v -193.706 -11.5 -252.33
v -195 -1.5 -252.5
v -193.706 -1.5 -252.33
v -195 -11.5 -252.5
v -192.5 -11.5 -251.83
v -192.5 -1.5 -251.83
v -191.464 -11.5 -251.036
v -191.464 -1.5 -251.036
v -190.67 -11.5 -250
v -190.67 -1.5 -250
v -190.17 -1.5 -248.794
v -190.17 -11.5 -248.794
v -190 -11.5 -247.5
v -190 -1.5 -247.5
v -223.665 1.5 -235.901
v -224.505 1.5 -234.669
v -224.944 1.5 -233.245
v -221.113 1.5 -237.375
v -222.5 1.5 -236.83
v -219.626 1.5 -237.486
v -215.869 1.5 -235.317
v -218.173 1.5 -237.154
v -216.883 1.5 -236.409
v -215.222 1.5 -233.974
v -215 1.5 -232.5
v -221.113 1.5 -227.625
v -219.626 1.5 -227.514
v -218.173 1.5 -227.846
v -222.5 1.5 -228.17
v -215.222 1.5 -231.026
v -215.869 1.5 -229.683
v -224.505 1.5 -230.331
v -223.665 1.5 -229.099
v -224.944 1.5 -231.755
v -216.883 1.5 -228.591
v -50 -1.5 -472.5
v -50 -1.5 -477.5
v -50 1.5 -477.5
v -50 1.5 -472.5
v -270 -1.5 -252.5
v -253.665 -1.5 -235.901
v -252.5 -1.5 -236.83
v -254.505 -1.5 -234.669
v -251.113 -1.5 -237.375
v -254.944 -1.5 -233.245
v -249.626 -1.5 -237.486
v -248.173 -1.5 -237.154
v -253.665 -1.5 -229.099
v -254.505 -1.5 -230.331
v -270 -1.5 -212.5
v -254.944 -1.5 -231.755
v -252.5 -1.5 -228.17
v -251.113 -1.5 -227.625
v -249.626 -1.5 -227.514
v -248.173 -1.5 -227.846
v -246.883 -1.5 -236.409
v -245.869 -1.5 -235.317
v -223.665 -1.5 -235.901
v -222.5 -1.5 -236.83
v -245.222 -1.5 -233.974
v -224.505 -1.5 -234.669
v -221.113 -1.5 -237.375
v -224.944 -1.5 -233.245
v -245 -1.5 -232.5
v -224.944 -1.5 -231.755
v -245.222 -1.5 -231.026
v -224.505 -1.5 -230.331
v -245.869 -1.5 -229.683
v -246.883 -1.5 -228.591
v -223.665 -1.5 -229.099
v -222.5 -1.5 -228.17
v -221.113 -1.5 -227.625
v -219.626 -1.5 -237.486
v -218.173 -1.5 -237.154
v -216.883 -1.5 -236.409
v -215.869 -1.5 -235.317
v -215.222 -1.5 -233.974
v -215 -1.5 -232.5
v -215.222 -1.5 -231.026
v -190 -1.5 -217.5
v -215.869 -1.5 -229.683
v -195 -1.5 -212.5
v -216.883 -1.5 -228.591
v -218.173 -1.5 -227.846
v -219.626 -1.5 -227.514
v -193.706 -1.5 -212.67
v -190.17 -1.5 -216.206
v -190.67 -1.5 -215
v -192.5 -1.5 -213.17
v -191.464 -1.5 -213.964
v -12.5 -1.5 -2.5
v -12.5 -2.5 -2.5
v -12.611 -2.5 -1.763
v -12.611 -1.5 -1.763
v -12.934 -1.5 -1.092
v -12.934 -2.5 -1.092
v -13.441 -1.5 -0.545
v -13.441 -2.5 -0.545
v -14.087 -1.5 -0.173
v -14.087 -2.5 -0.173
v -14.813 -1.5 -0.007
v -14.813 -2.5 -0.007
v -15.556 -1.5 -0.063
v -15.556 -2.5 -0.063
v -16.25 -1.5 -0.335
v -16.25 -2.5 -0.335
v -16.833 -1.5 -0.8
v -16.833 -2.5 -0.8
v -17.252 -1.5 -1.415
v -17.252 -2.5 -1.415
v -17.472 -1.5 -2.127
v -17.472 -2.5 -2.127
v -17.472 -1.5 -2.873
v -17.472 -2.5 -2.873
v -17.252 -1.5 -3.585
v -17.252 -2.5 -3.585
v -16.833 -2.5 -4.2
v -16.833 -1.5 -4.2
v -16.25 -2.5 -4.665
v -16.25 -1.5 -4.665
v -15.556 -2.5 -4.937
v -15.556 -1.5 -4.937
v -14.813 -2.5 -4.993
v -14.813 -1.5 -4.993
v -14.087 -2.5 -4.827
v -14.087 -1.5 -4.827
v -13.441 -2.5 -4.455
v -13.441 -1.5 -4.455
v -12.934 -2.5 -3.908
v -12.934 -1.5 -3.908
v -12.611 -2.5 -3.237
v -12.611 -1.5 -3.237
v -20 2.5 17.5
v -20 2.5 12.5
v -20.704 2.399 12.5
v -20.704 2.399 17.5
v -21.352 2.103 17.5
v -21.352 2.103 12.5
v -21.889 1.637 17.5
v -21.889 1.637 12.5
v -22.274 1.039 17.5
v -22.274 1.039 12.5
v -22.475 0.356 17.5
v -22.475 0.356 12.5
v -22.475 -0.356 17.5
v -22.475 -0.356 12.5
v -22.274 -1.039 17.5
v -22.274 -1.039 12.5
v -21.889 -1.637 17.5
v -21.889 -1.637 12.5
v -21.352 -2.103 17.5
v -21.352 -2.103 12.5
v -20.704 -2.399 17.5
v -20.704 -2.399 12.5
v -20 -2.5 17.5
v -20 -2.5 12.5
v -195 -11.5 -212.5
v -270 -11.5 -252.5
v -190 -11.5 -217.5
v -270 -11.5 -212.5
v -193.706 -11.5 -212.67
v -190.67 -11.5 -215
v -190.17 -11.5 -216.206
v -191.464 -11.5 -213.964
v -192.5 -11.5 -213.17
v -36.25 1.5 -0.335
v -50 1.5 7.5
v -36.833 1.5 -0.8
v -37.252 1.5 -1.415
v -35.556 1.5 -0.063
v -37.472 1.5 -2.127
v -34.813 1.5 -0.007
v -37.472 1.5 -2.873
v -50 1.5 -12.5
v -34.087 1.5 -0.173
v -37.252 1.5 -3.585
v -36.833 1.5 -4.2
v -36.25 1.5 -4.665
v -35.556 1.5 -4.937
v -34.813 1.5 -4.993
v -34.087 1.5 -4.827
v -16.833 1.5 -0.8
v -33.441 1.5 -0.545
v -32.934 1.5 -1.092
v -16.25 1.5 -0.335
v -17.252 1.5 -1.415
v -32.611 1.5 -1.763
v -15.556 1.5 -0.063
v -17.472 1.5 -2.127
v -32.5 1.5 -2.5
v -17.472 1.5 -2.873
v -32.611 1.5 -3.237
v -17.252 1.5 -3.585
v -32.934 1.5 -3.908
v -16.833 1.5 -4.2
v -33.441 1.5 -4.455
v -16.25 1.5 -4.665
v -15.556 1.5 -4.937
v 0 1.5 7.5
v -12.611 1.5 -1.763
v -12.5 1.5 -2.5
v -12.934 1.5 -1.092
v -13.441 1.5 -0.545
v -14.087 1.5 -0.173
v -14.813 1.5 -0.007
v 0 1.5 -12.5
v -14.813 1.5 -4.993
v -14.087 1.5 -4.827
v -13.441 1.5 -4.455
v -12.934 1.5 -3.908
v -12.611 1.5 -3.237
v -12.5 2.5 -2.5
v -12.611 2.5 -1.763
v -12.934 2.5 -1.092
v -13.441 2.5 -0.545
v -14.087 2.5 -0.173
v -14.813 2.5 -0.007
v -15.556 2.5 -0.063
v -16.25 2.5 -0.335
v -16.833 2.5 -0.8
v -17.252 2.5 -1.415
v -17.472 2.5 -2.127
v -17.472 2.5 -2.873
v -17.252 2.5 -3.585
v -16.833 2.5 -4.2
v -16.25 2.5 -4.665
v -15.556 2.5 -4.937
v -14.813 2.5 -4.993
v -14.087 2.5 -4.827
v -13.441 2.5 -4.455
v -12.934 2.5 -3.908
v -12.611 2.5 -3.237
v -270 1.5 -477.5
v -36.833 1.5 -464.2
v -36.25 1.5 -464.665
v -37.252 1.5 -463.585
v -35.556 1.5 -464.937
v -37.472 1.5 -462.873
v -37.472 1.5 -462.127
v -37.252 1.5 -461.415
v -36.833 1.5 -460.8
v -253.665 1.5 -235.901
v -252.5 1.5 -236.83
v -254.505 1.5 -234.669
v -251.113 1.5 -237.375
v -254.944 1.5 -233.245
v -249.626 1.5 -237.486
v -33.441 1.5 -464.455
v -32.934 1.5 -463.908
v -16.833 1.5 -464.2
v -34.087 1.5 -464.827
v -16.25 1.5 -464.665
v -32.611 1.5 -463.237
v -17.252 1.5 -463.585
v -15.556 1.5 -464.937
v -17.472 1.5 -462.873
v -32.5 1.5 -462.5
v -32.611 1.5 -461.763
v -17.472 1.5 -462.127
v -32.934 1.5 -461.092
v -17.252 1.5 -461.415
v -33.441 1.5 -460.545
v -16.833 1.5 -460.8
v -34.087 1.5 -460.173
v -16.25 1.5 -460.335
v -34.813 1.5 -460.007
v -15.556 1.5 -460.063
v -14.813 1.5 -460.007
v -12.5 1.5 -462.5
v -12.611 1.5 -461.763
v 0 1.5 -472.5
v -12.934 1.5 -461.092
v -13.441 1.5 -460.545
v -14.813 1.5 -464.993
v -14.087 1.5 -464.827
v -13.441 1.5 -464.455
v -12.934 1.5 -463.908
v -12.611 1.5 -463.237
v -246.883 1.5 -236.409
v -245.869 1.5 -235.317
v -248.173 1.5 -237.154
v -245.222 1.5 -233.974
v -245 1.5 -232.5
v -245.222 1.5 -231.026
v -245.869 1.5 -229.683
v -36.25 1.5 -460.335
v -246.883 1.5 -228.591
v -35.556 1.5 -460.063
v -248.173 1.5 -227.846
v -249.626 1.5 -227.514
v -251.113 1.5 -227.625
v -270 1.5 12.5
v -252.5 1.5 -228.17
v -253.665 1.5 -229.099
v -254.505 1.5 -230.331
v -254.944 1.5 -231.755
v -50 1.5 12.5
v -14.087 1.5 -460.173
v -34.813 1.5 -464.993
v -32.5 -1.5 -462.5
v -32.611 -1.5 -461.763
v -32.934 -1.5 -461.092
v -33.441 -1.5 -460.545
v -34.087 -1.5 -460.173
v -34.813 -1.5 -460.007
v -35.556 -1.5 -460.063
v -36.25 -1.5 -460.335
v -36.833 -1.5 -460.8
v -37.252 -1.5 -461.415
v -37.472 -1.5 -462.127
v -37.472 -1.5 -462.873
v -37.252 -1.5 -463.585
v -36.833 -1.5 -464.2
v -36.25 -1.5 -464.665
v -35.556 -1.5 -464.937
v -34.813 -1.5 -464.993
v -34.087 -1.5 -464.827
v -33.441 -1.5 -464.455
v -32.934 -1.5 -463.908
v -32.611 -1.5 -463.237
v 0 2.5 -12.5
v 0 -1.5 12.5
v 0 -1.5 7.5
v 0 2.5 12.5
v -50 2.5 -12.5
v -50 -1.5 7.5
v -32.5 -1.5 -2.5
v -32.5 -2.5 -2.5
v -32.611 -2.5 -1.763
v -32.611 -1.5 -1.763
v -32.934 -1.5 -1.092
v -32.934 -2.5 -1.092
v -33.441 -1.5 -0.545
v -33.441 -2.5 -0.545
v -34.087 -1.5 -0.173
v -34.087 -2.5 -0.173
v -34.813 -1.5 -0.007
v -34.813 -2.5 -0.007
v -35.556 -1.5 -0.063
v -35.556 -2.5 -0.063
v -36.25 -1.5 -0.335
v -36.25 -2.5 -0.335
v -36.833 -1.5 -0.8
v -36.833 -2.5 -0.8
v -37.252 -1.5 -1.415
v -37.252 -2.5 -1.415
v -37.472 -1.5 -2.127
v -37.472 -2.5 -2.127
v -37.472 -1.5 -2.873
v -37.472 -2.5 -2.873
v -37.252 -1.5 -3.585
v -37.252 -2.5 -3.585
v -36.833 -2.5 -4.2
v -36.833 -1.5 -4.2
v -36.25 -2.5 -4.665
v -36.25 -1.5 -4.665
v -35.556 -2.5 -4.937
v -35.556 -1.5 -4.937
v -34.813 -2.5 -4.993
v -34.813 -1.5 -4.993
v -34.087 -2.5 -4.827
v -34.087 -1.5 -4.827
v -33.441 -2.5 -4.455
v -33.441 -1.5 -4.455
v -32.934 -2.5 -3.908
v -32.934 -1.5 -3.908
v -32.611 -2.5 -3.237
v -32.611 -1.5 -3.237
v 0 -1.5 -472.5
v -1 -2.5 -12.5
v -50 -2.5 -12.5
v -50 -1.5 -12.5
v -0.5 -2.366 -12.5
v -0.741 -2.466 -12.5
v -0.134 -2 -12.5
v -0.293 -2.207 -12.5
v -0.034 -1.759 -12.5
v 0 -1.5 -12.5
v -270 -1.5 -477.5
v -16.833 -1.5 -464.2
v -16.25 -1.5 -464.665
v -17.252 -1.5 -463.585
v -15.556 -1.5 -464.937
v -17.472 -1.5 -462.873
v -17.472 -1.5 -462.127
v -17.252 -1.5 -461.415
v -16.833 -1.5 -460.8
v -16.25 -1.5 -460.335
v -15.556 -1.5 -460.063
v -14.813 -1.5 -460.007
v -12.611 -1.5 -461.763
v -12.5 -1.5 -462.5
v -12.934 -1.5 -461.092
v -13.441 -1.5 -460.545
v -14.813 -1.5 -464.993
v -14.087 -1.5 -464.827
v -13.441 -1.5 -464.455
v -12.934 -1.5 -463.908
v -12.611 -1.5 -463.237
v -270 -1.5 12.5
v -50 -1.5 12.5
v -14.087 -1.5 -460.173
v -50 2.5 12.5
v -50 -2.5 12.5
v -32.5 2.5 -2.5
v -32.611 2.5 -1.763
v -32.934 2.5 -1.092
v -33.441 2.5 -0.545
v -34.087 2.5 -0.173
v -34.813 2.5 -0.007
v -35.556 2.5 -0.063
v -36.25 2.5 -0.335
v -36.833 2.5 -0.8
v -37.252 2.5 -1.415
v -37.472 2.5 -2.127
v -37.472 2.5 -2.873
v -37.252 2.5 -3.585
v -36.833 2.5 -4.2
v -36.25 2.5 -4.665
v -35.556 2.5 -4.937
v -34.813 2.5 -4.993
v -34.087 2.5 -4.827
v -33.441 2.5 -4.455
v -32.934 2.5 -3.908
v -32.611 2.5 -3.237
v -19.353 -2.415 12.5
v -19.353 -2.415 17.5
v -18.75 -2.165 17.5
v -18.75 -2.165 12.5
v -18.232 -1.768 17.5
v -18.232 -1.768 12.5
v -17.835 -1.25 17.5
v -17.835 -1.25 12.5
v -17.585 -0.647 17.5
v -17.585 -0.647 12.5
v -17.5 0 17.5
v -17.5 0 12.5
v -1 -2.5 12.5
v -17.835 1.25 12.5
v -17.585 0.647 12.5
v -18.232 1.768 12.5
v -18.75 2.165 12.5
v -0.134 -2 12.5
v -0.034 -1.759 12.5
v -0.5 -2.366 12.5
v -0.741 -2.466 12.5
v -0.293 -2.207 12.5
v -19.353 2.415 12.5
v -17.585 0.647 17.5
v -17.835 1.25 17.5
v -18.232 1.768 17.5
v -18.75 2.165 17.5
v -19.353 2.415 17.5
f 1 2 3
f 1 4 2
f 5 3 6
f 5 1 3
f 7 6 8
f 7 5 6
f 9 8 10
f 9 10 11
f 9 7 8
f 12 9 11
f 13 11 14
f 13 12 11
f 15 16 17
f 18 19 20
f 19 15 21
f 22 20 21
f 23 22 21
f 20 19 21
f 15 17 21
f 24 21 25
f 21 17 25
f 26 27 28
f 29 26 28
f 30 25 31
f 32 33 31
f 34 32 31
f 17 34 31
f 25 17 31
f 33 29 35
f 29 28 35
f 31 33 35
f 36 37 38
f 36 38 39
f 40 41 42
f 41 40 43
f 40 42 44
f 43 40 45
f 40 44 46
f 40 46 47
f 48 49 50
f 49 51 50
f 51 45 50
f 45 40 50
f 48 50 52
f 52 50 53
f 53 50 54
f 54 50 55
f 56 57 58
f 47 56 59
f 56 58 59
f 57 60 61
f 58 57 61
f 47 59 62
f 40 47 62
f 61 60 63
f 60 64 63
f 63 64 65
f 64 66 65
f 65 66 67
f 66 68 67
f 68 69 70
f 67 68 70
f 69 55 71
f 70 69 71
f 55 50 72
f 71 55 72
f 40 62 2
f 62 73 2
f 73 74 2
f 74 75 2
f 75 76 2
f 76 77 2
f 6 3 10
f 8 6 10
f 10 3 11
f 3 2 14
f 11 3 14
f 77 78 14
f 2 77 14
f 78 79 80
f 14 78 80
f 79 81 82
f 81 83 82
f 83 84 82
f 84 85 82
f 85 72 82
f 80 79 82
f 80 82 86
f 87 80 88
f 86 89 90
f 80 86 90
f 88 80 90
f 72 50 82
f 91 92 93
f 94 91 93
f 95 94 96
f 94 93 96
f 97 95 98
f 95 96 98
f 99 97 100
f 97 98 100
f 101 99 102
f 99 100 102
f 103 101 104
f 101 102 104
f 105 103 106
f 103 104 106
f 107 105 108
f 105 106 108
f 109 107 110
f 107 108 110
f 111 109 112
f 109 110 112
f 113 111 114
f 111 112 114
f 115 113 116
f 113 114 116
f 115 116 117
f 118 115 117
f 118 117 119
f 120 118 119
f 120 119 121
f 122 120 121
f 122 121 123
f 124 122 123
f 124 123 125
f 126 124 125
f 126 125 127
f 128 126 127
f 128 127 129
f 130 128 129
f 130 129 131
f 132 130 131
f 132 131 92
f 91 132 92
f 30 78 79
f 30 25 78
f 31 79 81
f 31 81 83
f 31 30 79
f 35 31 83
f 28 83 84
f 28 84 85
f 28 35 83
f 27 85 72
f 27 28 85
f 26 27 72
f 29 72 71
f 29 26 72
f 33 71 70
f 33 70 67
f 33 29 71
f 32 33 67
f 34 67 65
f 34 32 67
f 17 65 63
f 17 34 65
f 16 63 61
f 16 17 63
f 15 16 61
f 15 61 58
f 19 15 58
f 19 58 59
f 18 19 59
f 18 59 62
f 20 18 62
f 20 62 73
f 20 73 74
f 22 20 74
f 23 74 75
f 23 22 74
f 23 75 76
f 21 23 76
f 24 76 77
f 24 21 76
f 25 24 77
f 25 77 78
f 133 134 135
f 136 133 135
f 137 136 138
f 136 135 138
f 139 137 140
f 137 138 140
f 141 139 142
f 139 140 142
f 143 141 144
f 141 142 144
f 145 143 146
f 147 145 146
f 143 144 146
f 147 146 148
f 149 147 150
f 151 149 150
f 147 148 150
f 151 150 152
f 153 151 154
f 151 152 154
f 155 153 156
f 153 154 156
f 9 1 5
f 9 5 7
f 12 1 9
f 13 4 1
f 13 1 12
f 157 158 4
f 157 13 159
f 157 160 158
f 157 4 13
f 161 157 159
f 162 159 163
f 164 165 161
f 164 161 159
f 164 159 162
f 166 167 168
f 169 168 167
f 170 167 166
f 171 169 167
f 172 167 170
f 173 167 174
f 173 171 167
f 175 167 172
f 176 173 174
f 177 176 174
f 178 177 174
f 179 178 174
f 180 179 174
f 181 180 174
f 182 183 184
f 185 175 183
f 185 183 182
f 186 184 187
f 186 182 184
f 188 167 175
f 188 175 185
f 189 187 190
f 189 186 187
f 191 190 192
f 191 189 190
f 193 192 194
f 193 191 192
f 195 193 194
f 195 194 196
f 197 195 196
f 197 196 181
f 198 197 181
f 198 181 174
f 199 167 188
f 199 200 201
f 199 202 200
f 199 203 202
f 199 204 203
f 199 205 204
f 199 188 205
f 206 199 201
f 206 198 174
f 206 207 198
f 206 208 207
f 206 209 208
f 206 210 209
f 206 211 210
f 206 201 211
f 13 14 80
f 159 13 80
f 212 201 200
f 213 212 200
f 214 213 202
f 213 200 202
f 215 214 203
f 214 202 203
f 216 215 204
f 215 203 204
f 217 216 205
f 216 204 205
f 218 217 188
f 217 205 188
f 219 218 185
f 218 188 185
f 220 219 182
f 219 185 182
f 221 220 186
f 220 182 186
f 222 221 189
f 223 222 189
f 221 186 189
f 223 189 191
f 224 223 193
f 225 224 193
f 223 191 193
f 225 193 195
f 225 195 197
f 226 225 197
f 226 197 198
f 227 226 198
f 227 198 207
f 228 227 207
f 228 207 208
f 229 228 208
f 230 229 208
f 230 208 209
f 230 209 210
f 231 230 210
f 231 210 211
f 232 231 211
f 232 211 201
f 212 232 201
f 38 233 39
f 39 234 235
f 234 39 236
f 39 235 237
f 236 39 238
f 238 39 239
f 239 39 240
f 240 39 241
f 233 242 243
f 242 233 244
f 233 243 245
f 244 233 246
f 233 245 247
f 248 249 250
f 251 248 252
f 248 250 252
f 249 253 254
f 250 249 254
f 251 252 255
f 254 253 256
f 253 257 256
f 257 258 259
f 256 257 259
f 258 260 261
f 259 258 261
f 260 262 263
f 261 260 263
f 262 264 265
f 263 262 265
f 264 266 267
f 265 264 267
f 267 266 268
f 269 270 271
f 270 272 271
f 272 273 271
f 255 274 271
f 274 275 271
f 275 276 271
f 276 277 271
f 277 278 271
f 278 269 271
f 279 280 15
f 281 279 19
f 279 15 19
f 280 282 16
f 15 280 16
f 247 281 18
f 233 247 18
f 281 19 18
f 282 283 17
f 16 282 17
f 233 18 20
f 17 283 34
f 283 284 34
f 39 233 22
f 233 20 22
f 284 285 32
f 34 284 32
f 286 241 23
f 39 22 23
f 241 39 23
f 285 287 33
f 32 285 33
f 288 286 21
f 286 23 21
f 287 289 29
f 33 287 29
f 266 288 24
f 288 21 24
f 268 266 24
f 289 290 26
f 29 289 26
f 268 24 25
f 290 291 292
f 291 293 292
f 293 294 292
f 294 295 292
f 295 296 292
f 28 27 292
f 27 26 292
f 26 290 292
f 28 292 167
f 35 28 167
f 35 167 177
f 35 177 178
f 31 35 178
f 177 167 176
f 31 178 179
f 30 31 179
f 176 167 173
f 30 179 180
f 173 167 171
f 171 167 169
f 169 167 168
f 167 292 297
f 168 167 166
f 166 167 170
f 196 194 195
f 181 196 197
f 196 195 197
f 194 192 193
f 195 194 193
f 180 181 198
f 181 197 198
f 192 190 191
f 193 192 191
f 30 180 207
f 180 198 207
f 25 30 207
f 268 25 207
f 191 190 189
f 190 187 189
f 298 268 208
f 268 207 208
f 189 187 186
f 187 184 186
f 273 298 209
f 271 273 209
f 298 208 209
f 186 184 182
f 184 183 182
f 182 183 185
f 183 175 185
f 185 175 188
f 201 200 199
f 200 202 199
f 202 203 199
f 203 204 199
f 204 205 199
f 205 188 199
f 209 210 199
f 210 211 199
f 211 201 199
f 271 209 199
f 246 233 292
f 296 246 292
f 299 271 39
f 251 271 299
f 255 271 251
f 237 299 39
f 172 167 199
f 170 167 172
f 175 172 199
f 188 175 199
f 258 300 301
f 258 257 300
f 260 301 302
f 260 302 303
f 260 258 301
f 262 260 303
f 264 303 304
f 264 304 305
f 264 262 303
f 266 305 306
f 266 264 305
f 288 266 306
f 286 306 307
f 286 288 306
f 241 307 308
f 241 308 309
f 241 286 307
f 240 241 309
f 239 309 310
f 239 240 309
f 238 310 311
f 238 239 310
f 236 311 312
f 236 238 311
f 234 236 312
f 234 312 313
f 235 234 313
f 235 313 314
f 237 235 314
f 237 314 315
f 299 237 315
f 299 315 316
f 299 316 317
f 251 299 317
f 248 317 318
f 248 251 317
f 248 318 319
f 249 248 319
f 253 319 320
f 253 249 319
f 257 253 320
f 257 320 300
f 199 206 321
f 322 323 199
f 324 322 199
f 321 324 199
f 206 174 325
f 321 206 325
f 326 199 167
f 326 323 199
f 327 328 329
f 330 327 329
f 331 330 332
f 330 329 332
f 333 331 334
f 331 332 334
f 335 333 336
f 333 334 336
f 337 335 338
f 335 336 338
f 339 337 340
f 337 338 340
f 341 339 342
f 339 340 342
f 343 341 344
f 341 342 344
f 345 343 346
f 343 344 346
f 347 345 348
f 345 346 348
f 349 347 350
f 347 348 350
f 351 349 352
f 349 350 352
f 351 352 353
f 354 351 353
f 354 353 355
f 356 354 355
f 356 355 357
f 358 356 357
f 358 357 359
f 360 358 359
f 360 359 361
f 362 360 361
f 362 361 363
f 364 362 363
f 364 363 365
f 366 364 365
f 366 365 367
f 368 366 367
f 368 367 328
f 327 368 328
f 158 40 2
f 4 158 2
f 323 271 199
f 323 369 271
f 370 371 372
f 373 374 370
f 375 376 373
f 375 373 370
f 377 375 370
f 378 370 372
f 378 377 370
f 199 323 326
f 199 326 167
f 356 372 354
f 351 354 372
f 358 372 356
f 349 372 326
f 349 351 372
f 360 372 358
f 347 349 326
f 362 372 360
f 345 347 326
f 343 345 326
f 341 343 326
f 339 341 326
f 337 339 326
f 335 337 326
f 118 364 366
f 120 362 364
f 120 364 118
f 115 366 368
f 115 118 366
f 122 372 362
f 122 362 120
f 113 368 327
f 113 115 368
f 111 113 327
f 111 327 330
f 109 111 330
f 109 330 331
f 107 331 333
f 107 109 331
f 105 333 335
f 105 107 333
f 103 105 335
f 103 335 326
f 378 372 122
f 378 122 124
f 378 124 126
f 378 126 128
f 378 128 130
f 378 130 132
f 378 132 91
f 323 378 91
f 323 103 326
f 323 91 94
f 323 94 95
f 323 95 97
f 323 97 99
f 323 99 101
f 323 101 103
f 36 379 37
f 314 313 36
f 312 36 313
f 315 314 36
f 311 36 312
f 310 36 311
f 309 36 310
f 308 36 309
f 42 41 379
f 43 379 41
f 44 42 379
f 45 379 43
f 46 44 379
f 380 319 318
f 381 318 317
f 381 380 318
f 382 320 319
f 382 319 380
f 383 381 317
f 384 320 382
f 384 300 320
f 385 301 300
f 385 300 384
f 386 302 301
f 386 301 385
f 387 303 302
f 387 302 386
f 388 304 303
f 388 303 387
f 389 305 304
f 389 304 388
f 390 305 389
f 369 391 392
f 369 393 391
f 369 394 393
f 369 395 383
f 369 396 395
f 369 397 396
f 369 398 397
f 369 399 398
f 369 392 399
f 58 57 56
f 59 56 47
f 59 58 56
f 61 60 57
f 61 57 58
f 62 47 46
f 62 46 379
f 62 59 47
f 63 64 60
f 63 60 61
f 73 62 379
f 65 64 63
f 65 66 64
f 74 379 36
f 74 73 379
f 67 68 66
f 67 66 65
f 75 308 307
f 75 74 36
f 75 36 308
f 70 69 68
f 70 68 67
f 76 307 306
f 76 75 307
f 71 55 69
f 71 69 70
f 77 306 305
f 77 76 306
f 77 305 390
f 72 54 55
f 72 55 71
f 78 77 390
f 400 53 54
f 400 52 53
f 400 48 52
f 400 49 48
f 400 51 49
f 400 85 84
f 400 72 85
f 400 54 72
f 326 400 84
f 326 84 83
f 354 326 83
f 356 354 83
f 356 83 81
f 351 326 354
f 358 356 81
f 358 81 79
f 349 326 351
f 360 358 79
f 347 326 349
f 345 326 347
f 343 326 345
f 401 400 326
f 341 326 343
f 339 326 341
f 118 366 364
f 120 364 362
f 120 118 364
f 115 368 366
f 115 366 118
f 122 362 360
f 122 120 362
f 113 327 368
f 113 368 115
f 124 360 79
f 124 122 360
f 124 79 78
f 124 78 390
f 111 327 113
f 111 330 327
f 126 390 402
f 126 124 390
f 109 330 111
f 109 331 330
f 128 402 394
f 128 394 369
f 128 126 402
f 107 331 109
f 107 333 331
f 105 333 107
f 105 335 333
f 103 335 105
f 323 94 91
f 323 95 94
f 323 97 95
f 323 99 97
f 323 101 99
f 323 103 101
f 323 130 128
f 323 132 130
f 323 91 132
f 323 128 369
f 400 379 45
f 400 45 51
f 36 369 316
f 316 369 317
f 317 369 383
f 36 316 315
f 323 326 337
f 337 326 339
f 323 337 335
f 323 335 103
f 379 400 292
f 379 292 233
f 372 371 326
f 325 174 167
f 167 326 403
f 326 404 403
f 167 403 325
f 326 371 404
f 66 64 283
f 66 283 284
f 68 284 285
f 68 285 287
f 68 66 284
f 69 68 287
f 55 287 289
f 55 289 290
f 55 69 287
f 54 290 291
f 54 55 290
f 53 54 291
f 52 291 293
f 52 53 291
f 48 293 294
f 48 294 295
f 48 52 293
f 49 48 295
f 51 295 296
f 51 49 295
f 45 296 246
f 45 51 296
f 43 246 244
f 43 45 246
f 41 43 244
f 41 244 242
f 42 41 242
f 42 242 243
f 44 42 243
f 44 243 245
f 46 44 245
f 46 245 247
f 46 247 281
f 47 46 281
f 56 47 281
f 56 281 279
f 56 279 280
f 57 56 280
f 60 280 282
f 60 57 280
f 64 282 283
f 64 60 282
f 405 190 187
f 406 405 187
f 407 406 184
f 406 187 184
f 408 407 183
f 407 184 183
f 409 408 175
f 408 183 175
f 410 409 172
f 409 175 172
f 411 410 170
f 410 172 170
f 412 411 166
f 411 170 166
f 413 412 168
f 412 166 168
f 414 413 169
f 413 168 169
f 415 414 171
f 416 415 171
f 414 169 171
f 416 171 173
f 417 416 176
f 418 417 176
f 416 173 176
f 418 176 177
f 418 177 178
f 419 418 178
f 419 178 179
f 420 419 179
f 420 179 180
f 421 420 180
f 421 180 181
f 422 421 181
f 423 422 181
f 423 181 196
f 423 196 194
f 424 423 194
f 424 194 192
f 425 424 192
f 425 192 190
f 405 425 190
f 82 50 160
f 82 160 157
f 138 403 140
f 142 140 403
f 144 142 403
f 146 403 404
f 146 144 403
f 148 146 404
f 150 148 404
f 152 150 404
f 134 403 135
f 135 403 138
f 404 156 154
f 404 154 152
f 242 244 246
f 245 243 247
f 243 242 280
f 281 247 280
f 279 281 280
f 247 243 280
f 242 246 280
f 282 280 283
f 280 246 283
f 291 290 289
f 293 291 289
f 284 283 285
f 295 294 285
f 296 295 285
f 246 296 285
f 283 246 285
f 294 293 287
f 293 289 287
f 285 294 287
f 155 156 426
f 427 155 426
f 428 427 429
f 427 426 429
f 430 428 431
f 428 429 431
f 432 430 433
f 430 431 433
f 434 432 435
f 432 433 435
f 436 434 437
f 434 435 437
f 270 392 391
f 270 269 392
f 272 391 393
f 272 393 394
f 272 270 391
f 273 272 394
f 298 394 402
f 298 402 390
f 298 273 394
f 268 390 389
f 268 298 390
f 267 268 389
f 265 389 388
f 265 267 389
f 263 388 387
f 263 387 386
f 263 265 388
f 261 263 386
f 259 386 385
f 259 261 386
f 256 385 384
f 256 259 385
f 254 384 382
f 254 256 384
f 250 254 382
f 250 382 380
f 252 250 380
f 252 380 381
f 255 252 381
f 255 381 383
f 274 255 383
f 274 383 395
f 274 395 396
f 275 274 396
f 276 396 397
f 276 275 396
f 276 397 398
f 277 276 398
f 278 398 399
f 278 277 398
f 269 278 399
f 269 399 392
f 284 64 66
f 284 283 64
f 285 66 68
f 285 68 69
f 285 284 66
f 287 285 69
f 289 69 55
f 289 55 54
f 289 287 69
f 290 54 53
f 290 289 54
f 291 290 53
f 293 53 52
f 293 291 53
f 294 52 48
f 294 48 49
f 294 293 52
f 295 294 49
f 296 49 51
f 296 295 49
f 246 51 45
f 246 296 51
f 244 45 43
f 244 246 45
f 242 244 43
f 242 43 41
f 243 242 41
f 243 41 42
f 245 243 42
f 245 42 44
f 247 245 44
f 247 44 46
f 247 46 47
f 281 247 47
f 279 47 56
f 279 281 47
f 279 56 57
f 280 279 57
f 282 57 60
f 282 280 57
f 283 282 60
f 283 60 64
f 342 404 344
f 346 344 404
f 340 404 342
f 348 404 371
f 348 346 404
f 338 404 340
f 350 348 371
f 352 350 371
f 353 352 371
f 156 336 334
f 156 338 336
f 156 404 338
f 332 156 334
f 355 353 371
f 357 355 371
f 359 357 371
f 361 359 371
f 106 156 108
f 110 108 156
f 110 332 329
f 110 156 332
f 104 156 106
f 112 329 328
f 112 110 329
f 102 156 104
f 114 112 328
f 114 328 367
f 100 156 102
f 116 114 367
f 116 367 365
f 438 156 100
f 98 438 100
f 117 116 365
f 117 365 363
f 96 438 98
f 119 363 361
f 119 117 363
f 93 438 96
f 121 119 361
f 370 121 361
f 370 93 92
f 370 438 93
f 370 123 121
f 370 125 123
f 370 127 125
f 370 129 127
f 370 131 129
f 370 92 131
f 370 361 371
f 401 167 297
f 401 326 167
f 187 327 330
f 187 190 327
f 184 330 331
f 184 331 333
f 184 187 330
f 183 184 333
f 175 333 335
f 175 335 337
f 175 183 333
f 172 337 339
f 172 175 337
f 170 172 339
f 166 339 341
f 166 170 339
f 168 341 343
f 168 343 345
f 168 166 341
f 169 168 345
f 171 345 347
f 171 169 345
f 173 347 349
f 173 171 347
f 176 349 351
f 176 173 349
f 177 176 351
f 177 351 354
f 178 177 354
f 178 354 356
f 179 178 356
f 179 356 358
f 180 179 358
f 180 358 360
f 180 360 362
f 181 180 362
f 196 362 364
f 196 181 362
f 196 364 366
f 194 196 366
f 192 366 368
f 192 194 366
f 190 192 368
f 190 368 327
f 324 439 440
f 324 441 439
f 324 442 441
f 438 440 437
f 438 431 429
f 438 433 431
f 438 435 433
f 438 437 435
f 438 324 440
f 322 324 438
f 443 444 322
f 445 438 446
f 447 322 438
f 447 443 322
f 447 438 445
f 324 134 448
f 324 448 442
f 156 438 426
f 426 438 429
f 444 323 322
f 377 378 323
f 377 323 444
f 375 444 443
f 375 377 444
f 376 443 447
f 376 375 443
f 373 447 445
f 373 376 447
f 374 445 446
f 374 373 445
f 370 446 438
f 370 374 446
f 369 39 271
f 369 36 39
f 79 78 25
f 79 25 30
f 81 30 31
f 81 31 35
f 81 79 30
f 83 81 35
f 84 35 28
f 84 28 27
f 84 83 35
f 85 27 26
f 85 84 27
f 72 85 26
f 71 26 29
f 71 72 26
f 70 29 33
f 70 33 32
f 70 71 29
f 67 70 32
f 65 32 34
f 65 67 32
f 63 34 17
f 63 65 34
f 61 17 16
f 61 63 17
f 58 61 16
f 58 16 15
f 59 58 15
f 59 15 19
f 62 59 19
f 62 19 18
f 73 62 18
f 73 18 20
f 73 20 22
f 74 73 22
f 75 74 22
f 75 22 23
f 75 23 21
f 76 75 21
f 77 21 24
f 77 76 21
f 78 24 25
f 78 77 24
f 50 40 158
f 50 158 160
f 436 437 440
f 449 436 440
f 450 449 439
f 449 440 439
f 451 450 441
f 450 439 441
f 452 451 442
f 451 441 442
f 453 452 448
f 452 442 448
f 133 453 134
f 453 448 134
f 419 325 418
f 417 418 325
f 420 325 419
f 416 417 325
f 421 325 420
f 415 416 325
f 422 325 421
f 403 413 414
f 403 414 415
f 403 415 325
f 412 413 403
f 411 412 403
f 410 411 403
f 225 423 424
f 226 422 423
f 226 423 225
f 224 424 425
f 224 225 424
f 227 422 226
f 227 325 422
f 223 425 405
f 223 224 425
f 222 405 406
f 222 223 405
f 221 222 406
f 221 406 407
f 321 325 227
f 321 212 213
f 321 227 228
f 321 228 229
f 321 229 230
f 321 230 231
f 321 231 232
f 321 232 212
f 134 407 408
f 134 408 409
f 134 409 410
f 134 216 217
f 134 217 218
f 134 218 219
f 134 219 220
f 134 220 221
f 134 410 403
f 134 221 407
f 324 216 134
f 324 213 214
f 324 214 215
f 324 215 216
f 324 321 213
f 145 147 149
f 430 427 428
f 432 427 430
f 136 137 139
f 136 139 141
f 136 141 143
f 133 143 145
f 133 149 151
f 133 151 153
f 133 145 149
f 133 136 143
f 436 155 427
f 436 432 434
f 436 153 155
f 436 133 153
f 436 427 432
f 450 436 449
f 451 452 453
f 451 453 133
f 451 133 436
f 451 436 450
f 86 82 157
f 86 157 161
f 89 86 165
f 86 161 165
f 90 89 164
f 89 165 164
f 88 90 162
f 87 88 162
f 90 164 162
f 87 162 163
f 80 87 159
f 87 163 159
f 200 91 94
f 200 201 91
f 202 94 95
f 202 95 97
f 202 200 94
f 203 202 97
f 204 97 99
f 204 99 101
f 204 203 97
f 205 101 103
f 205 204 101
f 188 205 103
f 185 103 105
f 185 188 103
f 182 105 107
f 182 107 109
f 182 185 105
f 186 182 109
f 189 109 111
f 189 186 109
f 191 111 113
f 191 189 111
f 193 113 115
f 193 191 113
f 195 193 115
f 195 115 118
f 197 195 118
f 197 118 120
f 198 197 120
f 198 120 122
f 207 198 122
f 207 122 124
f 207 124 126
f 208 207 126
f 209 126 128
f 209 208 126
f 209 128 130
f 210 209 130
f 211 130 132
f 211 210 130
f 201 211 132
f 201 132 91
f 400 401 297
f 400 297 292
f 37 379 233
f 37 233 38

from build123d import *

# Parameters (mm, degrees)
F1_DEPTH  = 50
F3_DEPTH  = 5
F4_R      = 2.5
F5_DEPTH  = 25
F6_R      = 2.5
F6_R_2    = 5
F7_DEPTH  = 1.5
F8_W      = 80
F8_H      = 40
F8_R      = 5
F9_DEPTH  = 10
F10_DEPTH = 3
F11_R     = 5
F12_R     = 1


with BuildPart() as f1:
    # F0 (on Right) → F1 (new body)
    with BuildSketch(Plane.YZ):
        Polygon((1.5, -12.5), (2.5, -12.5), (2.5, 12.5), (-2.5, 12.5), (-2.5, -12.5), (-1.5, -12.5), (-1.5, 7.5), (1.5, 7.5), align=None)
    extrude(amount=-F1_DEPTH)

    # F2 (on face) → F3 (join)
    with BuildSketch(Plane.XY.offset(12.5)):
        with BuildLine():
            ThreePointArc((-20, -2.5), (-18.232233047, -1.767766953), (-17.5, 0))
            ThreePointArc((-17.5, 0), (-18.232233047, 1.767766953), (-20, 2.5))
            ThreePointArc((-20, 2.5), (-22.5, 0), (-20, -2.5))
        make_face()
    extrude(amount=F3_DEPTH)

    # F4 (on face) → F5 (cut)
    with BuildSketch(Plane.XZ.offset(2.5)):
        with Locations((-35, -2.5)):
            Circle(F4_R)
        with Locations((-15, -2.5)):
            Circle(F4_R)
    extrude(amount=-F5_DEPTH, mode=Mode.SUBTRACT)

    # F12
    f12_edges = [f1.edges().sort_by_distance(p)[0] for p in [
        (0, -2.5, 0),
    ]]
    fillet(f12_edges, radius=F12_R)


with BuildPart() as f7:
    # F6 (on Front) → F7 (new body, symmetric)
    with BuildSketch(Plane.XZ):
        Polygon((-50, 7.5), (-50, 12.5), (-270, 12.5), (-270, -232.5), (-270, -477.5), (-50, -477.5), (-50, -472.5), (0, -472.5), (0, -232.5), (0, 7.5), align=None)
        with Locations((-35, -462.5)):
            Circle(F6_R, mode=Mode.SUBTRACT)
        with Locations((-15, -462.5)):
            Circle(F6_R, mode=Mode.SUBTRACT)
        with Locations((-250, -232.5)):
            Circle(F6_R_2, mode=Mode.SUBTRACT)
        with Locations((-220, -232.5)):
            Circle(F6_R_2, mode=Mode.SUBTRACT)
        with Locations((-35, -2.5)):
            Circle(F6_R, mode=Mode.SUBTRACT)
        with Locations((-15, -2.5)):
            Circle(F6_R, mode=Mode.SUBTRACT)
    extrude(amount=F7_DEPTH, both=True)


with BuildPart() as f9:
    # F8 (on face) → F9 (new body)
    with BuildSketch(Plane.XZ.offset(1.5)):
        with Locations((-230, -232.5)):
            Rectangle(F8_W, F8_H)
        with Locations((-250, -232.5)):
            Circle(F8_R, mode=Mode.SUBTRACT)
        with Locations((-220, -232.5)):
            Circle(F8_R, mode=Mode.SUBTRACT)
        with Locations((-250, -232.5)):
            Circle(F8_R)
        with Locations((-220, -232.5)):
            Circle(F8_R)
    extrude(amount=F9_DEPTH)

    # F8 (on face) → F10 (join)
    with BuildSketch(Plane.XZ.offset(1.5)):
        with Locations((-250, -232.5)):
            Circle(F8_R)
        with Locations((-220, -232.5)):
            Circle(F8_R)
    extrude(amount=-F10_DEPTH)

    # F11
    f11_edges = [f9.edges().sort_by_distance(p)[0] for p in [
        (-190, -6.5, -212.5),
        (-190, -6.5, -252.5),
    ]]
    fillet(f11_edges, radius=F11_R)


solid = Compound([f1.part, f7.part, f9.part])
